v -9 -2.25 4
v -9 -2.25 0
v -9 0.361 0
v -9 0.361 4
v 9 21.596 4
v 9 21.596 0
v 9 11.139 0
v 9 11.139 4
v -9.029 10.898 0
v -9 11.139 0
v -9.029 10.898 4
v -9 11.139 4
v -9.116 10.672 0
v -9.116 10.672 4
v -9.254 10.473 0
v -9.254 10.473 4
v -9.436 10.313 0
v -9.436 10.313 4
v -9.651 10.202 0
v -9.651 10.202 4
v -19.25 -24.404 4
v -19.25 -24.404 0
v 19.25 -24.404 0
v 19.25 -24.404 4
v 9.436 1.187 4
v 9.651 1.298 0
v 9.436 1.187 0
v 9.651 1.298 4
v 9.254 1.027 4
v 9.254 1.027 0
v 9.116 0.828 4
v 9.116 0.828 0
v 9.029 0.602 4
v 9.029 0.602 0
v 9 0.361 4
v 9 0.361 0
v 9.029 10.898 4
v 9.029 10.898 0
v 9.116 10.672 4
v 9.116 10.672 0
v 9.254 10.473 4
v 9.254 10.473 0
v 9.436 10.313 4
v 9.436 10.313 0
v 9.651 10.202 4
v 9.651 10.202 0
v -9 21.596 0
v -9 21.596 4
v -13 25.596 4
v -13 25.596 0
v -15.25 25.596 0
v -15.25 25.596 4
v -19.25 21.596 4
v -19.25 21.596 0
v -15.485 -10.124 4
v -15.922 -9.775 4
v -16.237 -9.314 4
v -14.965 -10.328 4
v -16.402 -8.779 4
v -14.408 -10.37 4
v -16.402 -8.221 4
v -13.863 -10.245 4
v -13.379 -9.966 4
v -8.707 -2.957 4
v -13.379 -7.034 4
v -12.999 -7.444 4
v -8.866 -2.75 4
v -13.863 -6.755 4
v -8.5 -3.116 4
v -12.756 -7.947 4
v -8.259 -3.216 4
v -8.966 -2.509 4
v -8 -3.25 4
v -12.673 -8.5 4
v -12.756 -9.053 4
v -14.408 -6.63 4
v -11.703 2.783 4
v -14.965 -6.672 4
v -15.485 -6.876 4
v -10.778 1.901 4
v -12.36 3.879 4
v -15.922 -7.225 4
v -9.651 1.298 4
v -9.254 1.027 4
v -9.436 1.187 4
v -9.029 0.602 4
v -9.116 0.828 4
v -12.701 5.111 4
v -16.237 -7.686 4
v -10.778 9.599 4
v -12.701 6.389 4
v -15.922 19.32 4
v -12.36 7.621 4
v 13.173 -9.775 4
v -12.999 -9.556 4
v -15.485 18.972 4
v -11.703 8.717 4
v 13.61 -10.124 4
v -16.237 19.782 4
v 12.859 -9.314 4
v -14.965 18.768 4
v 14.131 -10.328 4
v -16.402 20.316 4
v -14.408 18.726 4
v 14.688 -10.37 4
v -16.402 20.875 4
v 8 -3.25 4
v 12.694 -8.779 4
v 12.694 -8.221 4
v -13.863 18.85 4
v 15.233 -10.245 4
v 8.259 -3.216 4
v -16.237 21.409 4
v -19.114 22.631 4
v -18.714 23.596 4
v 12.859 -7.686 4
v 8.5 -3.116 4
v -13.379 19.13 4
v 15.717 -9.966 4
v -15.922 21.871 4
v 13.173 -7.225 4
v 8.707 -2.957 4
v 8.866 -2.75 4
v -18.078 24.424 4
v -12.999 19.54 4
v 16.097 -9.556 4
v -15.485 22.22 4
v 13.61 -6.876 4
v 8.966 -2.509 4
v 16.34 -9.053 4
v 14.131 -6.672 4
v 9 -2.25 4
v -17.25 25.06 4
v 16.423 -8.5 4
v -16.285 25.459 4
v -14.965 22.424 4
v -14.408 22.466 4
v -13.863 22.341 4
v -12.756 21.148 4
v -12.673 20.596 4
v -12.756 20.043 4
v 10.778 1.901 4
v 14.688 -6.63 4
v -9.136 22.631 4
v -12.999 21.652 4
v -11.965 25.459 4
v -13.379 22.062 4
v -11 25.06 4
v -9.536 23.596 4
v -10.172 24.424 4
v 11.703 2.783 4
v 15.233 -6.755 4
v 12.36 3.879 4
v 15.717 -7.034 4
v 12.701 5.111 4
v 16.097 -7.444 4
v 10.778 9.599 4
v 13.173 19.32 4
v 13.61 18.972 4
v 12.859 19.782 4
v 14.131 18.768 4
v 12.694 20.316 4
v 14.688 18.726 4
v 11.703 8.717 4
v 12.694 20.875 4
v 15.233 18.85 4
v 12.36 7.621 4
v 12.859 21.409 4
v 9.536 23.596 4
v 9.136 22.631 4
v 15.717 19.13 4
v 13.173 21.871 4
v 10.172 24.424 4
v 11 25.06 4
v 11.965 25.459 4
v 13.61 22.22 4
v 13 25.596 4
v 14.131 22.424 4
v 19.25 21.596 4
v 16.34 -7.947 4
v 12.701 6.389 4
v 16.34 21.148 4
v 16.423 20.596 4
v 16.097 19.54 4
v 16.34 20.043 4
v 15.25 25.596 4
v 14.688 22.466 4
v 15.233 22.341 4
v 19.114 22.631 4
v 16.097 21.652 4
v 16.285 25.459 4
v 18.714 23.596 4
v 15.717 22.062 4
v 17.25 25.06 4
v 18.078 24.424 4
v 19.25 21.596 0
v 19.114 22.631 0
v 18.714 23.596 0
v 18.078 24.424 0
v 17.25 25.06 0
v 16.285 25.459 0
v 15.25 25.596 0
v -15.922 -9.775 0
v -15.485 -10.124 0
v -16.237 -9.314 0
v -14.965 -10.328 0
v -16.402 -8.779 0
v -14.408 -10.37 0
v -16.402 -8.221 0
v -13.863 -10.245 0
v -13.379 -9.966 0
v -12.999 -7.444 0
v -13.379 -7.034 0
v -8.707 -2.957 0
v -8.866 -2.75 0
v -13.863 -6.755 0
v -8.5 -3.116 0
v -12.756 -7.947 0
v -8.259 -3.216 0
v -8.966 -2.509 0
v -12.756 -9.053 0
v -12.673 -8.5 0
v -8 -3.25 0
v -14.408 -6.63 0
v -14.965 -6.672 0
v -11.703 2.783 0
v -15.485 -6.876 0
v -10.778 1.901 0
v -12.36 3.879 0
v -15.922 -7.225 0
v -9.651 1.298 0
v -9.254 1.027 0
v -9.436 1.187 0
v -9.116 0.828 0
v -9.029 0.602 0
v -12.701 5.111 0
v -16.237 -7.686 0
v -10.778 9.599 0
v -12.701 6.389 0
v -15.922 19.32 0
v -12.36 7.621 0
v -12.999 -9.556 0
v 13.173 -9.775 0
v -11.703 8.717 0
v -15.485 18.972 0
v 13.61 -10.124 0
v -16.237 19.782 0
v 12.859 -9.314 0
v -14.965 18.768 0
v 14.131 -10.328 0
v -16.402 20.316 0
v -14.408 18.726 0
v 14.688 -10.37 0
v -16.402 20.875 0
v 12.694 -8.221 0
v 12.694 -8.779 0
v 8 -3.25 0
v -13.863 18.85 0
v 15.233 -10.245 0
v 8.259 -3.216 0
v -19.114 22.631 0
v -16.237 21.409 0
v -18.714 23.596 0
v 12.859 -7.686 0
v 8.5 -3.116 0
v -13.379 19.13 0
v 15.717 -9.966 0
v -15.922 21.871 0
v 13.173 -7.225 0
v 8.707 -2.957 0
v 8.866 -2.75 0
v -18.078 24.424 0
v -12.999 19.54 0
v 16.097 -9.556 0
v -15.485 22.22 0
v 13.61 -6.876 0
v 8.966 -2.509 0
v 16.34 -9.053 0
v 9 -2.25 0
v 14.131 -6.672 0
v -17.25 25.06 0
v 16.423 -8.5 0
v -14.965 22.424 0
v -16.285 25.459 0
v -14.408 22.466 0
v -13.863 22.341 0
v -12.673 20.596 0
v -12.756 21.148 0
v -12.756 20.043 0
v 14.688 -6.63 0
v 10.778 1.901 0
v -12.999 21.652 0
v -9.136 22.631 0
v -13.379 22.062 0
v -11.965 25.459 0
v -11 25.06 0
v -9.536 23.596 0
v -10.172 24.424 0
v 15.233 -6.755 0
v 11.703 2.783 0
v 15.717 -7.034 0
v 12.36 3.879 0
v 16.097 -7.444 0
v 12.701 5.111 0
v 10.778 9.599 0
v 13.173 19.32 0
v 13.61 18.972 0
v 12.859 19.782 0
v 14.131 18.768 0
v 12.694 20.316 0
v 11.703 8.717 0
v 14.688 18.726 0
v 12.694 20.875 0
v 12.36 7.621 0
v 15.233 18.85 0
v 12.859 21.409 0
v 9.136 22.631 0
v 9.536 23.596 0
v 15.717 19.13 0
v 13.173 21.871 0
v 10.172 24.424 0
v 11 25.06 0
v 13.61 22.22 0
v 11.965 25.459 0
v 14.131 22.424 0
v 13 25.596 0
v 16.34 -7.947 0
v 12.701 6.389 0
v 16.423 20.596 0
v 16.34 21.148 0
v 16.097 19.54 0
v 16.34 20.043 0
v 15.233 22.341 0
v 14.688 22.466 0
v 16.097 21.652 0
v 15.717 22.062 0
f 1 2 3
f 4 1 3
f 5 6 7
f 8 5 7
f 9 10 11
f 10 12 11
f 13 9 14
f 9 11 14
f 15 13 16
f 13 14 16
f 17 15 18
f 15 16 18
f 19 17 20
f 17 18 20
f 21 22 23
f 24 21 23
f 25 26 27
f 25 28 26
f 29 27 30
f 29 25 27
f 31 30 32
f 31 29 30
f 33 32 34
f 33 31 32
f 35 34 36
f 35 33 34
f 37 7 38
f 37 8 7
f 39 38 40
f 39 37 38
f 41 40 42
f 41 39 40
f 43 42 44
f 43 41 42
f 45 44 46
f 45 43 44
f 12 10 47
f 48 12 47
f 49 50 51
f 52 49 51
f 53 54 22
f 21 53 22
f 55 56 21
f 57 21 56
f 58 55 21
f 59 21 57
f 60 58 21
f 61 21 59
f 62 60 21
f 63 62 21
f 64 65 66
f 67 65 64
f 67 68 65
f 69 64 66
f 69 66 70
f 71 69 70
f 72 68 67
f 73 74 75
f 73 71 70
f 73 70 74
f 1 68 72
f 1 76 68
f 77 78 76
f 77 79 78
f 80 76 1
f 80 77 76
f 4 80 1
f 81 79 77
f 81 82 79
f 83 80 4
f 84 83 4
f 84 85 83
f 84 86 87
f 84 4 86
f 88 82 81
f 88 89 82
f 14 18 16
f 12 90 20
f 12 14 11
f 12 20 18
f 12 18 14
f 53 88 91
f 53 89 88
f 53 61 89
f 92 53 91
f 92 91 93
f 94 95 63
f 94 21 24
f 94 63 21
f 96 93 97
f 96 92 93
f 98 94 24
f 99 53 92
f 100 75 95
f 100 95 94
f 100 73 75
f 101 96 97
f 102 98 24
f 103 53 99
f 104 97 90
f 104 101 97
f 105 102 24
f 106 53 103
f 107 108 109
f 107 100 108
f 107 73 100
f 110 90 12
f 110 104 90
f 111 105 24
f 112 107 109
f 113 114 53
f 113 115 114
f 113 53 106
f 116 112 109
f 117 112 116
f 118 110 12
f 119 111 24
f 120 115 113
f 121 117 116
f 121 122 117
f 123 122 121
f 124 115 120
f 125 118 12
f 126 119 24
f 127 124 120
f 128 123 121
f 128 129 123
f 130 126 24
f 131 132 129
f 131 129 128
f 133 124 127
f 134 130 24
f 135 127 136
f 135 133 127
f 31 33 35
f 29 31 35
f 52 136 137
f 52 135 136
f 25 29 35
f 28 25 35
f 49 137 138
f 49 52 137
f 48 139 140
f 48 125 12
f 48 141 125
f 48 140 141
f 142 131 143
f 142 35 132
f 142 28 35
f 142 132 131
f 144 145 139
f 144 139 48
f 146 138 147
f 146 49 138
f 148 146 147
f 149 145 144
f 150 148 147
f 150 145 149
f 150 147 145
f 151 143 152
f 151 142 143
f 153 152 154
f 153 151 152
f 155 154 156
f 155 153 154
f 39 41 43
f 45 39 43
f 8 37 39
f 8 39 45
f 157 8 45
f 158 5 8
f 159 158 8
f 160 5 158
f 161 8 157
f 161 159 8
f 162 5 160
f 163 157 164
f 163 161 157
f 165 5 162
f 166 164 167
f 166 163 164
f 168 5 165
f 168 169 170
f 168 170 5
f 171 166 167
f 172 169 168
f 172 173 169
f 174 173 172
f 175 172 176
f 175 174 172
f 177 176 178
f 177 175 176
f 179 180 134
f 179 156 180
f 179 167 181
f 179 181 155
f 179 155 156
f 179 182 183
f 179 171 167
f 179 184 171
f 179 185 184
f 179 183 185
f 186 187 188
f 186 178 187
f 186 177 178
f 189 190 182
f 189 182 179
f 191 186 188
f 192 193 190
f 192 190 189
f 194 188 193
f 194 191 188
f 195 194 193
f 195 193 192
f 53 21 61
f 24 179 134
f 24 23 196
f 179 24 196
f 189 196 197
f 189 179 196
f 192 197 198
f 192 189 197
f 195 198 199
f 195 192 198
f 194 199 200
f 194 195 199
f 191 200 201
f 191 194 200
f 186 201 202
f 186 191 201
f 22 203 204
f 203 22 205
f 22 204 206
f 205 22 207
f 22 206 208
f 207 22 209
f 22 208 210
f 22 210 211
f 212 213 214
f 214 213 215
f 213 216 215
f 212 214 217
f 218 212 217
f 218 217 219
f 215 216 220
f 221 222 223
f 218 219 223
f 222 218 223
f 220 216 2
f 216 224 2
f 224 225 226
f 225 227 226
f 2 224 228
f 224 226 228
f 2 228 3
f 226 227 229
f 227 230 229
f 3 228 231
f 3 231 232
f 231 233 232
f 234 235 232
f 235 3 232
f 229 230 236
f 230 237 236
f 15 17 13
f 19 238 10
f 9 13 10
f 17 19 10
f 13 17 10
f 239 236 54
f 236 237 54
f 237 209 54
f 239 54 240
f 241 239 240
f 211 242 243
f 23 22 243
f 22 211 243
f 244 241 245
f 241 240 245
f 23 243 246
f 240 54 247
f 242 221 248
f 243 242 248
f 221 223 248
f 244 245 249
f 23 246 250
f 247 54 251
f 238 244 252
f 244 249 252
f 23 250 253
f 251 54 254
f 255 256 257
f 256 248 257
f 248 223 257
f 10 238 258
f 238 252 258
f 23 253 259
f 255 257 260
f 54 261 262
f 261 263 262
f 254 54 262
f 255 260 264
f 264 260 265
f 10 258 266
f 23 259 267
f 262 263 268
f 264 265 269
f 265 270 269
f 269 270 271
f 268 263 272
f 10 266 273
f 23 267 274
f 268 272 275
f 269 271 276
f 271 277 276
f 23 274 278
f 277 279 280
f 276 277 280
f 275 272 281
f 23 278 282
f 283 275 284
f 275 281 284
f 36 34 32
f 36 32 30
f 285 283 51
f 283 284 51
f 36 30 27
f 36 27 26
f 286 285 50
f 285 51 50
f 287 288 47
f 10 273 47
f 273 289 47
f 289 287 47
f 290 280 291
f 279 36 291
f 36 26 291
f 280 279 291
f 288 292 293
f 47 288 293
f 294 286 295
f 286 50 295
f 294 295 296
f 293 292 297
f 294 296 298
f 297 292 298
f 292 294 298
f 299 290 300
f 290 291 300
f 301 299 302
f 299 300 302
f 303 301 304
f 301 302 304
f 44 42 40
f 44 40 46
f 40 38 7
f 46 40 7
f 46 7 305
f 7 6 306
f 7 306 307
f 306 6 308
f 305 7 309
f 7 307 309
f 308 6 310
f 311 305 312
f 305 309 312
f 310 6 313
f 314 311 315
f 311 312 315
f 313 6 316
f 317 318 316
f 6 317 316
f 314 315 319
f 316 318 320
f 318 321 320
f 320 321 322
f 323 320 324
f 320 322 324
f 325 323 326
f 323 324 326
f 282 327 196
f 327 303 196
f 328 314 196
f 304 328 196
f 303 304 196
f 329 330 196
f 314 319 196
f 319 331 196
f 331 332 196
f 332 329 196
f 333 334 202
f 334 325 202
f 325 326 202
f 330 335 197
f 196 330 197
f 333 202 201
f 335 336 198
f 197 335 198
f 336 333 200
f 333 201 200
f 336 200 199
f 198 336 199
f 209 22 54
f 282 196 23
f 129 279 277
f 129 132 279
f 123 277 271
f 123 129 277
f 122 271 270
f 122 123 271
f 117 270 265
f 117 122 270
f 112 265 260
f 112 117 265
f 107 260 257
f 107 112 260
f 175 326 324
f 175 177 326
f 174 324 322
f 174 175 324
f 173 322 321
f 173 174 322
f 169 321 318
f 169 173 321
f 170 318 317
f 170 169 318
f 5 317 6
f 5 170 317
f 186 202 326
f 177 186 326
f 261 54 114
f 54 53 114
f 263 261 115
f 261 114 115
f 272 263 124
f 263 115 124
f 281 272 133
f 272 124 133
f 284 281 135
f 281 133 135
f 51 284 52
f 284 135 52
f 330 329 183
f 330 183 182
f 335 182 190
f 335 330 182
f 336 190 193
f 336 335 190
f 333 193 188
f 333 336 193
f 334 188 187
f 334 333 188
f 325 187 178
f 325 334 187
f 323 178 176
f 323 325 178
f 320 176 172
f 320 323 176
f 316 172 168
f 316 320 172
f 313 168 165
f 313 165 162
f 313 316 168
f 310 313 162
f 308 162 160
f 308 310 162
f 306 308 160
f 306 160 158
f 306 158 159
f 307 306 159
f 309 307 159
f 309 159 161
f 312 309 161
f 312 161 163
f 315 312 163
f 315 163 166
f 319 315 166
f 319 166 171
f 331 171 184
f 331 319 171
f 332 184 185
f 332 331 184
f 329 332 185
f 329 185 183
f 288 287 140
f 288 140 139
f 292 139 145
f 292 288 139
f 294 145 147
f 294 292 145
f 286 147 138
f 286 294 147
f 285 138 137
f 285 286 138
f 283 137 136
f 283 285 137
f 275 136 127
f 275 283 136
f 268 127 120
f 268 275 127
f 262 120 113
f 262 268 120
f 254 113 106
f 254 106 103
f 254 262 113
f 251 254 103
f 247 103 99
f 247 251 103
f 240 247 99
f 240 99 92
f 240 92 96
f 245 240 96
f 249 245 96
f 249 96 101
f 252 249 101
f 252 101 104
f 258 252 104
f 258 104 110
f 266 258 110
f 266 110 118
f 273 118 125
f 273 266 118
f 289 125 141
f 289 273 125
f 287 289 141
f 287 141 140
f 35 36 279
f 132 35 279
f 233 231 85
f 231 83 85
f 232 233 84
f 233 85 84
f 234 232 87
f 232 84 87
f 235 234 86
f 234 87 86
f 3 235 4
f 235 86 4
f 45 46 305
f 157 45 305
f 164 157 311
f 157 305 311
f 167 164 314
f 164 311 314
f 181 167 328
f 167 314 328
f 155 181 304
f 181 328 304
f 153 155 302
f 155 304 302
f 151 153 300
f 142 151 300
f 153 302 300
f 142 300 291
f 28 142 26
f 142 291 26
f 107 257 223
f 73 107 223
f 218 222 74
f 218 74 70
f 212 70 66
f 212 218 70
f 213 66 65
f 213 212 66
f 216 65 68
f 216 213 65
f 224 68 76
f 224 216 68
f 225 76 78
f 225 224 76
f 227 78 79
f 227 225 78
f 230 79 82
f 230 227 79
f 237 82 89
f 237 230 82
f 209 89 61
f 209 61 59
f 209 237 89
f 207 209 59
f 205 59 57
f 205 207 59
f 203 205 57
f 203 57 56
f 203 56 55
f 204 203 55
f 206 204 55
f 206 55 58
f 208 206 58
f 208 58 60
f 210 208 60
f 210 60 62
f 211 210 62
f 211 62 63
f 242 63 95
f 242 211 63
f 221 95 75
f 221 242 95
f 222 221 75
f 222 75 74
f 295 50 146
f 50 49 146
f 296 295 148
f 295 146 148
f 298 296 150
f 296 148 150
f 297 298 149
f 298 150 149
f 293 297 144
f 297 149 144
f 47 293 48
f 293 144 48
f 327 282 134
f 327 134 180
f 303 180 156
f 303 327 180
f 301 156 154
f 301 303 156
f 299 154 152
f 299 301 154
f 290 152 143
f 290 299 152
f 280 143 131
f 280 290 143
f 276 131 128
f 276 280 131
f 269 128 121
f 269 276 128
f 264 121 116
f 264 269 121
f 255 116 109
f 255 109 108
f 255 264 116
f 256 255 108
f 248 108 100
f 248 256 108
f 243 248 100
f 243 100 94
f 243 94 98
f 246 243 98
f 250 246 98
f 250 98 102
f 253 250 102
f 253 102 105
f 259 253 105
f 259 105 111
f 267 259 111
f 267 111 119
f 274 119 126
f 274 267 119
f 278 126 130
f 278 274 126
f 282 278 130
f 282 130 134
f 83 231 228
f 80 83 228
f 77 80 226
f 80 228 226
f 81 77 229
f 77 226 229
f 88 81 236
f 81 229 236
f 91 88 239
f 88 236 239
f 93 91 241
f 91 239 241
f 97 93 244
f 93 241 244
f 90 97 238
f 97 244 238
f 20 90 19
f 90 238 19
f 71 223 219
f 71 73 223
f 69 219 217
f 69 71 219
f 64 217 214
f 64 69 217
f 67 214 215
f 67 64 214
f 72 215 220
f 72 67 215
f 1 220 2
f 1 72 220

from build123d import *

# Parameters (mm, degrees)
F0_R     = 1.875
F1_DEPTH = 4
F2_R     = 4
F3_R     = 1


with BuildPart() as f1:
    # F0 (on Top) → F1 (new body)
    with BuildSketch(Plane.XY):
        with BuildLine():
            Line((19.25, -24.404246), (19.25, 25.595754))
            Line((19.25, 25.595754), (9, 25.595754))
            Line((9, 25.595754), (9, 10.392248))
            ThreePointArc((9, 10.392248), (12.744, 5.75), (9, 1.107752))
            Line((9, 1.107752), (9, -3.25))
            Line((9, -3.25), (-9, -3.25))
            Line((-9, -3.25), (-9, 1.107752))
            ThreePointArc((-9, 1.107752), (-12.744, 5.75), (-9, 10.392248))
            Line((-9, 10.392248), (-9, 25.595754))
            Line((-9, 25.595754), (-19.25, 25.595754))
            Line((-19.25, 25.595754), (-19.25, -24.404246))
            Line((-19.25, -24.404246), (19.25, -24.404246))
        make_face()
        with Locations((-14.547877, -8.5)):
            Circle(F0_R, mode=Mode.SUBTRACT)
        with Locations((14.547877, -8.5)):
            Circle(F0_R, mode=Mode.SUBTRACT)
        with Locations((-14.547877, 20.595754)):
            Circle(F0_R, mode=Mode.SUBTRACT)
        with Locations((14.547877, 20.595754)):
            Circle(F0_R, mode=Mode.SUBTRACT)
    extrude(amount=F1_DEPTH)

    # F2
    f2_edges = [f1.edges().sort_by_distance(p)[0] for p in [
        (19.25, 25.595754, 2),
        (-19.25, 25.595754, 2),
        (-9, 25.595754, 2),
        (9, 25.595754, 2),
    ]]
    fillet(f2_edges, radius=F2_R)

    # F3
    f3_edges = [f1.edges().sort_by_distance(p)[0] for p in [
        (-9, 10.392248, 2),
        (-9, 1.107752, 2),
        (-9, -3.25, 2),
        (9, -3.25, 2),
        (9, 1.107752, 2),
        (9, 10.392248, 2),
    ]]
    fillet(f3_edges, radius=F3_R)


solid = f1.part
